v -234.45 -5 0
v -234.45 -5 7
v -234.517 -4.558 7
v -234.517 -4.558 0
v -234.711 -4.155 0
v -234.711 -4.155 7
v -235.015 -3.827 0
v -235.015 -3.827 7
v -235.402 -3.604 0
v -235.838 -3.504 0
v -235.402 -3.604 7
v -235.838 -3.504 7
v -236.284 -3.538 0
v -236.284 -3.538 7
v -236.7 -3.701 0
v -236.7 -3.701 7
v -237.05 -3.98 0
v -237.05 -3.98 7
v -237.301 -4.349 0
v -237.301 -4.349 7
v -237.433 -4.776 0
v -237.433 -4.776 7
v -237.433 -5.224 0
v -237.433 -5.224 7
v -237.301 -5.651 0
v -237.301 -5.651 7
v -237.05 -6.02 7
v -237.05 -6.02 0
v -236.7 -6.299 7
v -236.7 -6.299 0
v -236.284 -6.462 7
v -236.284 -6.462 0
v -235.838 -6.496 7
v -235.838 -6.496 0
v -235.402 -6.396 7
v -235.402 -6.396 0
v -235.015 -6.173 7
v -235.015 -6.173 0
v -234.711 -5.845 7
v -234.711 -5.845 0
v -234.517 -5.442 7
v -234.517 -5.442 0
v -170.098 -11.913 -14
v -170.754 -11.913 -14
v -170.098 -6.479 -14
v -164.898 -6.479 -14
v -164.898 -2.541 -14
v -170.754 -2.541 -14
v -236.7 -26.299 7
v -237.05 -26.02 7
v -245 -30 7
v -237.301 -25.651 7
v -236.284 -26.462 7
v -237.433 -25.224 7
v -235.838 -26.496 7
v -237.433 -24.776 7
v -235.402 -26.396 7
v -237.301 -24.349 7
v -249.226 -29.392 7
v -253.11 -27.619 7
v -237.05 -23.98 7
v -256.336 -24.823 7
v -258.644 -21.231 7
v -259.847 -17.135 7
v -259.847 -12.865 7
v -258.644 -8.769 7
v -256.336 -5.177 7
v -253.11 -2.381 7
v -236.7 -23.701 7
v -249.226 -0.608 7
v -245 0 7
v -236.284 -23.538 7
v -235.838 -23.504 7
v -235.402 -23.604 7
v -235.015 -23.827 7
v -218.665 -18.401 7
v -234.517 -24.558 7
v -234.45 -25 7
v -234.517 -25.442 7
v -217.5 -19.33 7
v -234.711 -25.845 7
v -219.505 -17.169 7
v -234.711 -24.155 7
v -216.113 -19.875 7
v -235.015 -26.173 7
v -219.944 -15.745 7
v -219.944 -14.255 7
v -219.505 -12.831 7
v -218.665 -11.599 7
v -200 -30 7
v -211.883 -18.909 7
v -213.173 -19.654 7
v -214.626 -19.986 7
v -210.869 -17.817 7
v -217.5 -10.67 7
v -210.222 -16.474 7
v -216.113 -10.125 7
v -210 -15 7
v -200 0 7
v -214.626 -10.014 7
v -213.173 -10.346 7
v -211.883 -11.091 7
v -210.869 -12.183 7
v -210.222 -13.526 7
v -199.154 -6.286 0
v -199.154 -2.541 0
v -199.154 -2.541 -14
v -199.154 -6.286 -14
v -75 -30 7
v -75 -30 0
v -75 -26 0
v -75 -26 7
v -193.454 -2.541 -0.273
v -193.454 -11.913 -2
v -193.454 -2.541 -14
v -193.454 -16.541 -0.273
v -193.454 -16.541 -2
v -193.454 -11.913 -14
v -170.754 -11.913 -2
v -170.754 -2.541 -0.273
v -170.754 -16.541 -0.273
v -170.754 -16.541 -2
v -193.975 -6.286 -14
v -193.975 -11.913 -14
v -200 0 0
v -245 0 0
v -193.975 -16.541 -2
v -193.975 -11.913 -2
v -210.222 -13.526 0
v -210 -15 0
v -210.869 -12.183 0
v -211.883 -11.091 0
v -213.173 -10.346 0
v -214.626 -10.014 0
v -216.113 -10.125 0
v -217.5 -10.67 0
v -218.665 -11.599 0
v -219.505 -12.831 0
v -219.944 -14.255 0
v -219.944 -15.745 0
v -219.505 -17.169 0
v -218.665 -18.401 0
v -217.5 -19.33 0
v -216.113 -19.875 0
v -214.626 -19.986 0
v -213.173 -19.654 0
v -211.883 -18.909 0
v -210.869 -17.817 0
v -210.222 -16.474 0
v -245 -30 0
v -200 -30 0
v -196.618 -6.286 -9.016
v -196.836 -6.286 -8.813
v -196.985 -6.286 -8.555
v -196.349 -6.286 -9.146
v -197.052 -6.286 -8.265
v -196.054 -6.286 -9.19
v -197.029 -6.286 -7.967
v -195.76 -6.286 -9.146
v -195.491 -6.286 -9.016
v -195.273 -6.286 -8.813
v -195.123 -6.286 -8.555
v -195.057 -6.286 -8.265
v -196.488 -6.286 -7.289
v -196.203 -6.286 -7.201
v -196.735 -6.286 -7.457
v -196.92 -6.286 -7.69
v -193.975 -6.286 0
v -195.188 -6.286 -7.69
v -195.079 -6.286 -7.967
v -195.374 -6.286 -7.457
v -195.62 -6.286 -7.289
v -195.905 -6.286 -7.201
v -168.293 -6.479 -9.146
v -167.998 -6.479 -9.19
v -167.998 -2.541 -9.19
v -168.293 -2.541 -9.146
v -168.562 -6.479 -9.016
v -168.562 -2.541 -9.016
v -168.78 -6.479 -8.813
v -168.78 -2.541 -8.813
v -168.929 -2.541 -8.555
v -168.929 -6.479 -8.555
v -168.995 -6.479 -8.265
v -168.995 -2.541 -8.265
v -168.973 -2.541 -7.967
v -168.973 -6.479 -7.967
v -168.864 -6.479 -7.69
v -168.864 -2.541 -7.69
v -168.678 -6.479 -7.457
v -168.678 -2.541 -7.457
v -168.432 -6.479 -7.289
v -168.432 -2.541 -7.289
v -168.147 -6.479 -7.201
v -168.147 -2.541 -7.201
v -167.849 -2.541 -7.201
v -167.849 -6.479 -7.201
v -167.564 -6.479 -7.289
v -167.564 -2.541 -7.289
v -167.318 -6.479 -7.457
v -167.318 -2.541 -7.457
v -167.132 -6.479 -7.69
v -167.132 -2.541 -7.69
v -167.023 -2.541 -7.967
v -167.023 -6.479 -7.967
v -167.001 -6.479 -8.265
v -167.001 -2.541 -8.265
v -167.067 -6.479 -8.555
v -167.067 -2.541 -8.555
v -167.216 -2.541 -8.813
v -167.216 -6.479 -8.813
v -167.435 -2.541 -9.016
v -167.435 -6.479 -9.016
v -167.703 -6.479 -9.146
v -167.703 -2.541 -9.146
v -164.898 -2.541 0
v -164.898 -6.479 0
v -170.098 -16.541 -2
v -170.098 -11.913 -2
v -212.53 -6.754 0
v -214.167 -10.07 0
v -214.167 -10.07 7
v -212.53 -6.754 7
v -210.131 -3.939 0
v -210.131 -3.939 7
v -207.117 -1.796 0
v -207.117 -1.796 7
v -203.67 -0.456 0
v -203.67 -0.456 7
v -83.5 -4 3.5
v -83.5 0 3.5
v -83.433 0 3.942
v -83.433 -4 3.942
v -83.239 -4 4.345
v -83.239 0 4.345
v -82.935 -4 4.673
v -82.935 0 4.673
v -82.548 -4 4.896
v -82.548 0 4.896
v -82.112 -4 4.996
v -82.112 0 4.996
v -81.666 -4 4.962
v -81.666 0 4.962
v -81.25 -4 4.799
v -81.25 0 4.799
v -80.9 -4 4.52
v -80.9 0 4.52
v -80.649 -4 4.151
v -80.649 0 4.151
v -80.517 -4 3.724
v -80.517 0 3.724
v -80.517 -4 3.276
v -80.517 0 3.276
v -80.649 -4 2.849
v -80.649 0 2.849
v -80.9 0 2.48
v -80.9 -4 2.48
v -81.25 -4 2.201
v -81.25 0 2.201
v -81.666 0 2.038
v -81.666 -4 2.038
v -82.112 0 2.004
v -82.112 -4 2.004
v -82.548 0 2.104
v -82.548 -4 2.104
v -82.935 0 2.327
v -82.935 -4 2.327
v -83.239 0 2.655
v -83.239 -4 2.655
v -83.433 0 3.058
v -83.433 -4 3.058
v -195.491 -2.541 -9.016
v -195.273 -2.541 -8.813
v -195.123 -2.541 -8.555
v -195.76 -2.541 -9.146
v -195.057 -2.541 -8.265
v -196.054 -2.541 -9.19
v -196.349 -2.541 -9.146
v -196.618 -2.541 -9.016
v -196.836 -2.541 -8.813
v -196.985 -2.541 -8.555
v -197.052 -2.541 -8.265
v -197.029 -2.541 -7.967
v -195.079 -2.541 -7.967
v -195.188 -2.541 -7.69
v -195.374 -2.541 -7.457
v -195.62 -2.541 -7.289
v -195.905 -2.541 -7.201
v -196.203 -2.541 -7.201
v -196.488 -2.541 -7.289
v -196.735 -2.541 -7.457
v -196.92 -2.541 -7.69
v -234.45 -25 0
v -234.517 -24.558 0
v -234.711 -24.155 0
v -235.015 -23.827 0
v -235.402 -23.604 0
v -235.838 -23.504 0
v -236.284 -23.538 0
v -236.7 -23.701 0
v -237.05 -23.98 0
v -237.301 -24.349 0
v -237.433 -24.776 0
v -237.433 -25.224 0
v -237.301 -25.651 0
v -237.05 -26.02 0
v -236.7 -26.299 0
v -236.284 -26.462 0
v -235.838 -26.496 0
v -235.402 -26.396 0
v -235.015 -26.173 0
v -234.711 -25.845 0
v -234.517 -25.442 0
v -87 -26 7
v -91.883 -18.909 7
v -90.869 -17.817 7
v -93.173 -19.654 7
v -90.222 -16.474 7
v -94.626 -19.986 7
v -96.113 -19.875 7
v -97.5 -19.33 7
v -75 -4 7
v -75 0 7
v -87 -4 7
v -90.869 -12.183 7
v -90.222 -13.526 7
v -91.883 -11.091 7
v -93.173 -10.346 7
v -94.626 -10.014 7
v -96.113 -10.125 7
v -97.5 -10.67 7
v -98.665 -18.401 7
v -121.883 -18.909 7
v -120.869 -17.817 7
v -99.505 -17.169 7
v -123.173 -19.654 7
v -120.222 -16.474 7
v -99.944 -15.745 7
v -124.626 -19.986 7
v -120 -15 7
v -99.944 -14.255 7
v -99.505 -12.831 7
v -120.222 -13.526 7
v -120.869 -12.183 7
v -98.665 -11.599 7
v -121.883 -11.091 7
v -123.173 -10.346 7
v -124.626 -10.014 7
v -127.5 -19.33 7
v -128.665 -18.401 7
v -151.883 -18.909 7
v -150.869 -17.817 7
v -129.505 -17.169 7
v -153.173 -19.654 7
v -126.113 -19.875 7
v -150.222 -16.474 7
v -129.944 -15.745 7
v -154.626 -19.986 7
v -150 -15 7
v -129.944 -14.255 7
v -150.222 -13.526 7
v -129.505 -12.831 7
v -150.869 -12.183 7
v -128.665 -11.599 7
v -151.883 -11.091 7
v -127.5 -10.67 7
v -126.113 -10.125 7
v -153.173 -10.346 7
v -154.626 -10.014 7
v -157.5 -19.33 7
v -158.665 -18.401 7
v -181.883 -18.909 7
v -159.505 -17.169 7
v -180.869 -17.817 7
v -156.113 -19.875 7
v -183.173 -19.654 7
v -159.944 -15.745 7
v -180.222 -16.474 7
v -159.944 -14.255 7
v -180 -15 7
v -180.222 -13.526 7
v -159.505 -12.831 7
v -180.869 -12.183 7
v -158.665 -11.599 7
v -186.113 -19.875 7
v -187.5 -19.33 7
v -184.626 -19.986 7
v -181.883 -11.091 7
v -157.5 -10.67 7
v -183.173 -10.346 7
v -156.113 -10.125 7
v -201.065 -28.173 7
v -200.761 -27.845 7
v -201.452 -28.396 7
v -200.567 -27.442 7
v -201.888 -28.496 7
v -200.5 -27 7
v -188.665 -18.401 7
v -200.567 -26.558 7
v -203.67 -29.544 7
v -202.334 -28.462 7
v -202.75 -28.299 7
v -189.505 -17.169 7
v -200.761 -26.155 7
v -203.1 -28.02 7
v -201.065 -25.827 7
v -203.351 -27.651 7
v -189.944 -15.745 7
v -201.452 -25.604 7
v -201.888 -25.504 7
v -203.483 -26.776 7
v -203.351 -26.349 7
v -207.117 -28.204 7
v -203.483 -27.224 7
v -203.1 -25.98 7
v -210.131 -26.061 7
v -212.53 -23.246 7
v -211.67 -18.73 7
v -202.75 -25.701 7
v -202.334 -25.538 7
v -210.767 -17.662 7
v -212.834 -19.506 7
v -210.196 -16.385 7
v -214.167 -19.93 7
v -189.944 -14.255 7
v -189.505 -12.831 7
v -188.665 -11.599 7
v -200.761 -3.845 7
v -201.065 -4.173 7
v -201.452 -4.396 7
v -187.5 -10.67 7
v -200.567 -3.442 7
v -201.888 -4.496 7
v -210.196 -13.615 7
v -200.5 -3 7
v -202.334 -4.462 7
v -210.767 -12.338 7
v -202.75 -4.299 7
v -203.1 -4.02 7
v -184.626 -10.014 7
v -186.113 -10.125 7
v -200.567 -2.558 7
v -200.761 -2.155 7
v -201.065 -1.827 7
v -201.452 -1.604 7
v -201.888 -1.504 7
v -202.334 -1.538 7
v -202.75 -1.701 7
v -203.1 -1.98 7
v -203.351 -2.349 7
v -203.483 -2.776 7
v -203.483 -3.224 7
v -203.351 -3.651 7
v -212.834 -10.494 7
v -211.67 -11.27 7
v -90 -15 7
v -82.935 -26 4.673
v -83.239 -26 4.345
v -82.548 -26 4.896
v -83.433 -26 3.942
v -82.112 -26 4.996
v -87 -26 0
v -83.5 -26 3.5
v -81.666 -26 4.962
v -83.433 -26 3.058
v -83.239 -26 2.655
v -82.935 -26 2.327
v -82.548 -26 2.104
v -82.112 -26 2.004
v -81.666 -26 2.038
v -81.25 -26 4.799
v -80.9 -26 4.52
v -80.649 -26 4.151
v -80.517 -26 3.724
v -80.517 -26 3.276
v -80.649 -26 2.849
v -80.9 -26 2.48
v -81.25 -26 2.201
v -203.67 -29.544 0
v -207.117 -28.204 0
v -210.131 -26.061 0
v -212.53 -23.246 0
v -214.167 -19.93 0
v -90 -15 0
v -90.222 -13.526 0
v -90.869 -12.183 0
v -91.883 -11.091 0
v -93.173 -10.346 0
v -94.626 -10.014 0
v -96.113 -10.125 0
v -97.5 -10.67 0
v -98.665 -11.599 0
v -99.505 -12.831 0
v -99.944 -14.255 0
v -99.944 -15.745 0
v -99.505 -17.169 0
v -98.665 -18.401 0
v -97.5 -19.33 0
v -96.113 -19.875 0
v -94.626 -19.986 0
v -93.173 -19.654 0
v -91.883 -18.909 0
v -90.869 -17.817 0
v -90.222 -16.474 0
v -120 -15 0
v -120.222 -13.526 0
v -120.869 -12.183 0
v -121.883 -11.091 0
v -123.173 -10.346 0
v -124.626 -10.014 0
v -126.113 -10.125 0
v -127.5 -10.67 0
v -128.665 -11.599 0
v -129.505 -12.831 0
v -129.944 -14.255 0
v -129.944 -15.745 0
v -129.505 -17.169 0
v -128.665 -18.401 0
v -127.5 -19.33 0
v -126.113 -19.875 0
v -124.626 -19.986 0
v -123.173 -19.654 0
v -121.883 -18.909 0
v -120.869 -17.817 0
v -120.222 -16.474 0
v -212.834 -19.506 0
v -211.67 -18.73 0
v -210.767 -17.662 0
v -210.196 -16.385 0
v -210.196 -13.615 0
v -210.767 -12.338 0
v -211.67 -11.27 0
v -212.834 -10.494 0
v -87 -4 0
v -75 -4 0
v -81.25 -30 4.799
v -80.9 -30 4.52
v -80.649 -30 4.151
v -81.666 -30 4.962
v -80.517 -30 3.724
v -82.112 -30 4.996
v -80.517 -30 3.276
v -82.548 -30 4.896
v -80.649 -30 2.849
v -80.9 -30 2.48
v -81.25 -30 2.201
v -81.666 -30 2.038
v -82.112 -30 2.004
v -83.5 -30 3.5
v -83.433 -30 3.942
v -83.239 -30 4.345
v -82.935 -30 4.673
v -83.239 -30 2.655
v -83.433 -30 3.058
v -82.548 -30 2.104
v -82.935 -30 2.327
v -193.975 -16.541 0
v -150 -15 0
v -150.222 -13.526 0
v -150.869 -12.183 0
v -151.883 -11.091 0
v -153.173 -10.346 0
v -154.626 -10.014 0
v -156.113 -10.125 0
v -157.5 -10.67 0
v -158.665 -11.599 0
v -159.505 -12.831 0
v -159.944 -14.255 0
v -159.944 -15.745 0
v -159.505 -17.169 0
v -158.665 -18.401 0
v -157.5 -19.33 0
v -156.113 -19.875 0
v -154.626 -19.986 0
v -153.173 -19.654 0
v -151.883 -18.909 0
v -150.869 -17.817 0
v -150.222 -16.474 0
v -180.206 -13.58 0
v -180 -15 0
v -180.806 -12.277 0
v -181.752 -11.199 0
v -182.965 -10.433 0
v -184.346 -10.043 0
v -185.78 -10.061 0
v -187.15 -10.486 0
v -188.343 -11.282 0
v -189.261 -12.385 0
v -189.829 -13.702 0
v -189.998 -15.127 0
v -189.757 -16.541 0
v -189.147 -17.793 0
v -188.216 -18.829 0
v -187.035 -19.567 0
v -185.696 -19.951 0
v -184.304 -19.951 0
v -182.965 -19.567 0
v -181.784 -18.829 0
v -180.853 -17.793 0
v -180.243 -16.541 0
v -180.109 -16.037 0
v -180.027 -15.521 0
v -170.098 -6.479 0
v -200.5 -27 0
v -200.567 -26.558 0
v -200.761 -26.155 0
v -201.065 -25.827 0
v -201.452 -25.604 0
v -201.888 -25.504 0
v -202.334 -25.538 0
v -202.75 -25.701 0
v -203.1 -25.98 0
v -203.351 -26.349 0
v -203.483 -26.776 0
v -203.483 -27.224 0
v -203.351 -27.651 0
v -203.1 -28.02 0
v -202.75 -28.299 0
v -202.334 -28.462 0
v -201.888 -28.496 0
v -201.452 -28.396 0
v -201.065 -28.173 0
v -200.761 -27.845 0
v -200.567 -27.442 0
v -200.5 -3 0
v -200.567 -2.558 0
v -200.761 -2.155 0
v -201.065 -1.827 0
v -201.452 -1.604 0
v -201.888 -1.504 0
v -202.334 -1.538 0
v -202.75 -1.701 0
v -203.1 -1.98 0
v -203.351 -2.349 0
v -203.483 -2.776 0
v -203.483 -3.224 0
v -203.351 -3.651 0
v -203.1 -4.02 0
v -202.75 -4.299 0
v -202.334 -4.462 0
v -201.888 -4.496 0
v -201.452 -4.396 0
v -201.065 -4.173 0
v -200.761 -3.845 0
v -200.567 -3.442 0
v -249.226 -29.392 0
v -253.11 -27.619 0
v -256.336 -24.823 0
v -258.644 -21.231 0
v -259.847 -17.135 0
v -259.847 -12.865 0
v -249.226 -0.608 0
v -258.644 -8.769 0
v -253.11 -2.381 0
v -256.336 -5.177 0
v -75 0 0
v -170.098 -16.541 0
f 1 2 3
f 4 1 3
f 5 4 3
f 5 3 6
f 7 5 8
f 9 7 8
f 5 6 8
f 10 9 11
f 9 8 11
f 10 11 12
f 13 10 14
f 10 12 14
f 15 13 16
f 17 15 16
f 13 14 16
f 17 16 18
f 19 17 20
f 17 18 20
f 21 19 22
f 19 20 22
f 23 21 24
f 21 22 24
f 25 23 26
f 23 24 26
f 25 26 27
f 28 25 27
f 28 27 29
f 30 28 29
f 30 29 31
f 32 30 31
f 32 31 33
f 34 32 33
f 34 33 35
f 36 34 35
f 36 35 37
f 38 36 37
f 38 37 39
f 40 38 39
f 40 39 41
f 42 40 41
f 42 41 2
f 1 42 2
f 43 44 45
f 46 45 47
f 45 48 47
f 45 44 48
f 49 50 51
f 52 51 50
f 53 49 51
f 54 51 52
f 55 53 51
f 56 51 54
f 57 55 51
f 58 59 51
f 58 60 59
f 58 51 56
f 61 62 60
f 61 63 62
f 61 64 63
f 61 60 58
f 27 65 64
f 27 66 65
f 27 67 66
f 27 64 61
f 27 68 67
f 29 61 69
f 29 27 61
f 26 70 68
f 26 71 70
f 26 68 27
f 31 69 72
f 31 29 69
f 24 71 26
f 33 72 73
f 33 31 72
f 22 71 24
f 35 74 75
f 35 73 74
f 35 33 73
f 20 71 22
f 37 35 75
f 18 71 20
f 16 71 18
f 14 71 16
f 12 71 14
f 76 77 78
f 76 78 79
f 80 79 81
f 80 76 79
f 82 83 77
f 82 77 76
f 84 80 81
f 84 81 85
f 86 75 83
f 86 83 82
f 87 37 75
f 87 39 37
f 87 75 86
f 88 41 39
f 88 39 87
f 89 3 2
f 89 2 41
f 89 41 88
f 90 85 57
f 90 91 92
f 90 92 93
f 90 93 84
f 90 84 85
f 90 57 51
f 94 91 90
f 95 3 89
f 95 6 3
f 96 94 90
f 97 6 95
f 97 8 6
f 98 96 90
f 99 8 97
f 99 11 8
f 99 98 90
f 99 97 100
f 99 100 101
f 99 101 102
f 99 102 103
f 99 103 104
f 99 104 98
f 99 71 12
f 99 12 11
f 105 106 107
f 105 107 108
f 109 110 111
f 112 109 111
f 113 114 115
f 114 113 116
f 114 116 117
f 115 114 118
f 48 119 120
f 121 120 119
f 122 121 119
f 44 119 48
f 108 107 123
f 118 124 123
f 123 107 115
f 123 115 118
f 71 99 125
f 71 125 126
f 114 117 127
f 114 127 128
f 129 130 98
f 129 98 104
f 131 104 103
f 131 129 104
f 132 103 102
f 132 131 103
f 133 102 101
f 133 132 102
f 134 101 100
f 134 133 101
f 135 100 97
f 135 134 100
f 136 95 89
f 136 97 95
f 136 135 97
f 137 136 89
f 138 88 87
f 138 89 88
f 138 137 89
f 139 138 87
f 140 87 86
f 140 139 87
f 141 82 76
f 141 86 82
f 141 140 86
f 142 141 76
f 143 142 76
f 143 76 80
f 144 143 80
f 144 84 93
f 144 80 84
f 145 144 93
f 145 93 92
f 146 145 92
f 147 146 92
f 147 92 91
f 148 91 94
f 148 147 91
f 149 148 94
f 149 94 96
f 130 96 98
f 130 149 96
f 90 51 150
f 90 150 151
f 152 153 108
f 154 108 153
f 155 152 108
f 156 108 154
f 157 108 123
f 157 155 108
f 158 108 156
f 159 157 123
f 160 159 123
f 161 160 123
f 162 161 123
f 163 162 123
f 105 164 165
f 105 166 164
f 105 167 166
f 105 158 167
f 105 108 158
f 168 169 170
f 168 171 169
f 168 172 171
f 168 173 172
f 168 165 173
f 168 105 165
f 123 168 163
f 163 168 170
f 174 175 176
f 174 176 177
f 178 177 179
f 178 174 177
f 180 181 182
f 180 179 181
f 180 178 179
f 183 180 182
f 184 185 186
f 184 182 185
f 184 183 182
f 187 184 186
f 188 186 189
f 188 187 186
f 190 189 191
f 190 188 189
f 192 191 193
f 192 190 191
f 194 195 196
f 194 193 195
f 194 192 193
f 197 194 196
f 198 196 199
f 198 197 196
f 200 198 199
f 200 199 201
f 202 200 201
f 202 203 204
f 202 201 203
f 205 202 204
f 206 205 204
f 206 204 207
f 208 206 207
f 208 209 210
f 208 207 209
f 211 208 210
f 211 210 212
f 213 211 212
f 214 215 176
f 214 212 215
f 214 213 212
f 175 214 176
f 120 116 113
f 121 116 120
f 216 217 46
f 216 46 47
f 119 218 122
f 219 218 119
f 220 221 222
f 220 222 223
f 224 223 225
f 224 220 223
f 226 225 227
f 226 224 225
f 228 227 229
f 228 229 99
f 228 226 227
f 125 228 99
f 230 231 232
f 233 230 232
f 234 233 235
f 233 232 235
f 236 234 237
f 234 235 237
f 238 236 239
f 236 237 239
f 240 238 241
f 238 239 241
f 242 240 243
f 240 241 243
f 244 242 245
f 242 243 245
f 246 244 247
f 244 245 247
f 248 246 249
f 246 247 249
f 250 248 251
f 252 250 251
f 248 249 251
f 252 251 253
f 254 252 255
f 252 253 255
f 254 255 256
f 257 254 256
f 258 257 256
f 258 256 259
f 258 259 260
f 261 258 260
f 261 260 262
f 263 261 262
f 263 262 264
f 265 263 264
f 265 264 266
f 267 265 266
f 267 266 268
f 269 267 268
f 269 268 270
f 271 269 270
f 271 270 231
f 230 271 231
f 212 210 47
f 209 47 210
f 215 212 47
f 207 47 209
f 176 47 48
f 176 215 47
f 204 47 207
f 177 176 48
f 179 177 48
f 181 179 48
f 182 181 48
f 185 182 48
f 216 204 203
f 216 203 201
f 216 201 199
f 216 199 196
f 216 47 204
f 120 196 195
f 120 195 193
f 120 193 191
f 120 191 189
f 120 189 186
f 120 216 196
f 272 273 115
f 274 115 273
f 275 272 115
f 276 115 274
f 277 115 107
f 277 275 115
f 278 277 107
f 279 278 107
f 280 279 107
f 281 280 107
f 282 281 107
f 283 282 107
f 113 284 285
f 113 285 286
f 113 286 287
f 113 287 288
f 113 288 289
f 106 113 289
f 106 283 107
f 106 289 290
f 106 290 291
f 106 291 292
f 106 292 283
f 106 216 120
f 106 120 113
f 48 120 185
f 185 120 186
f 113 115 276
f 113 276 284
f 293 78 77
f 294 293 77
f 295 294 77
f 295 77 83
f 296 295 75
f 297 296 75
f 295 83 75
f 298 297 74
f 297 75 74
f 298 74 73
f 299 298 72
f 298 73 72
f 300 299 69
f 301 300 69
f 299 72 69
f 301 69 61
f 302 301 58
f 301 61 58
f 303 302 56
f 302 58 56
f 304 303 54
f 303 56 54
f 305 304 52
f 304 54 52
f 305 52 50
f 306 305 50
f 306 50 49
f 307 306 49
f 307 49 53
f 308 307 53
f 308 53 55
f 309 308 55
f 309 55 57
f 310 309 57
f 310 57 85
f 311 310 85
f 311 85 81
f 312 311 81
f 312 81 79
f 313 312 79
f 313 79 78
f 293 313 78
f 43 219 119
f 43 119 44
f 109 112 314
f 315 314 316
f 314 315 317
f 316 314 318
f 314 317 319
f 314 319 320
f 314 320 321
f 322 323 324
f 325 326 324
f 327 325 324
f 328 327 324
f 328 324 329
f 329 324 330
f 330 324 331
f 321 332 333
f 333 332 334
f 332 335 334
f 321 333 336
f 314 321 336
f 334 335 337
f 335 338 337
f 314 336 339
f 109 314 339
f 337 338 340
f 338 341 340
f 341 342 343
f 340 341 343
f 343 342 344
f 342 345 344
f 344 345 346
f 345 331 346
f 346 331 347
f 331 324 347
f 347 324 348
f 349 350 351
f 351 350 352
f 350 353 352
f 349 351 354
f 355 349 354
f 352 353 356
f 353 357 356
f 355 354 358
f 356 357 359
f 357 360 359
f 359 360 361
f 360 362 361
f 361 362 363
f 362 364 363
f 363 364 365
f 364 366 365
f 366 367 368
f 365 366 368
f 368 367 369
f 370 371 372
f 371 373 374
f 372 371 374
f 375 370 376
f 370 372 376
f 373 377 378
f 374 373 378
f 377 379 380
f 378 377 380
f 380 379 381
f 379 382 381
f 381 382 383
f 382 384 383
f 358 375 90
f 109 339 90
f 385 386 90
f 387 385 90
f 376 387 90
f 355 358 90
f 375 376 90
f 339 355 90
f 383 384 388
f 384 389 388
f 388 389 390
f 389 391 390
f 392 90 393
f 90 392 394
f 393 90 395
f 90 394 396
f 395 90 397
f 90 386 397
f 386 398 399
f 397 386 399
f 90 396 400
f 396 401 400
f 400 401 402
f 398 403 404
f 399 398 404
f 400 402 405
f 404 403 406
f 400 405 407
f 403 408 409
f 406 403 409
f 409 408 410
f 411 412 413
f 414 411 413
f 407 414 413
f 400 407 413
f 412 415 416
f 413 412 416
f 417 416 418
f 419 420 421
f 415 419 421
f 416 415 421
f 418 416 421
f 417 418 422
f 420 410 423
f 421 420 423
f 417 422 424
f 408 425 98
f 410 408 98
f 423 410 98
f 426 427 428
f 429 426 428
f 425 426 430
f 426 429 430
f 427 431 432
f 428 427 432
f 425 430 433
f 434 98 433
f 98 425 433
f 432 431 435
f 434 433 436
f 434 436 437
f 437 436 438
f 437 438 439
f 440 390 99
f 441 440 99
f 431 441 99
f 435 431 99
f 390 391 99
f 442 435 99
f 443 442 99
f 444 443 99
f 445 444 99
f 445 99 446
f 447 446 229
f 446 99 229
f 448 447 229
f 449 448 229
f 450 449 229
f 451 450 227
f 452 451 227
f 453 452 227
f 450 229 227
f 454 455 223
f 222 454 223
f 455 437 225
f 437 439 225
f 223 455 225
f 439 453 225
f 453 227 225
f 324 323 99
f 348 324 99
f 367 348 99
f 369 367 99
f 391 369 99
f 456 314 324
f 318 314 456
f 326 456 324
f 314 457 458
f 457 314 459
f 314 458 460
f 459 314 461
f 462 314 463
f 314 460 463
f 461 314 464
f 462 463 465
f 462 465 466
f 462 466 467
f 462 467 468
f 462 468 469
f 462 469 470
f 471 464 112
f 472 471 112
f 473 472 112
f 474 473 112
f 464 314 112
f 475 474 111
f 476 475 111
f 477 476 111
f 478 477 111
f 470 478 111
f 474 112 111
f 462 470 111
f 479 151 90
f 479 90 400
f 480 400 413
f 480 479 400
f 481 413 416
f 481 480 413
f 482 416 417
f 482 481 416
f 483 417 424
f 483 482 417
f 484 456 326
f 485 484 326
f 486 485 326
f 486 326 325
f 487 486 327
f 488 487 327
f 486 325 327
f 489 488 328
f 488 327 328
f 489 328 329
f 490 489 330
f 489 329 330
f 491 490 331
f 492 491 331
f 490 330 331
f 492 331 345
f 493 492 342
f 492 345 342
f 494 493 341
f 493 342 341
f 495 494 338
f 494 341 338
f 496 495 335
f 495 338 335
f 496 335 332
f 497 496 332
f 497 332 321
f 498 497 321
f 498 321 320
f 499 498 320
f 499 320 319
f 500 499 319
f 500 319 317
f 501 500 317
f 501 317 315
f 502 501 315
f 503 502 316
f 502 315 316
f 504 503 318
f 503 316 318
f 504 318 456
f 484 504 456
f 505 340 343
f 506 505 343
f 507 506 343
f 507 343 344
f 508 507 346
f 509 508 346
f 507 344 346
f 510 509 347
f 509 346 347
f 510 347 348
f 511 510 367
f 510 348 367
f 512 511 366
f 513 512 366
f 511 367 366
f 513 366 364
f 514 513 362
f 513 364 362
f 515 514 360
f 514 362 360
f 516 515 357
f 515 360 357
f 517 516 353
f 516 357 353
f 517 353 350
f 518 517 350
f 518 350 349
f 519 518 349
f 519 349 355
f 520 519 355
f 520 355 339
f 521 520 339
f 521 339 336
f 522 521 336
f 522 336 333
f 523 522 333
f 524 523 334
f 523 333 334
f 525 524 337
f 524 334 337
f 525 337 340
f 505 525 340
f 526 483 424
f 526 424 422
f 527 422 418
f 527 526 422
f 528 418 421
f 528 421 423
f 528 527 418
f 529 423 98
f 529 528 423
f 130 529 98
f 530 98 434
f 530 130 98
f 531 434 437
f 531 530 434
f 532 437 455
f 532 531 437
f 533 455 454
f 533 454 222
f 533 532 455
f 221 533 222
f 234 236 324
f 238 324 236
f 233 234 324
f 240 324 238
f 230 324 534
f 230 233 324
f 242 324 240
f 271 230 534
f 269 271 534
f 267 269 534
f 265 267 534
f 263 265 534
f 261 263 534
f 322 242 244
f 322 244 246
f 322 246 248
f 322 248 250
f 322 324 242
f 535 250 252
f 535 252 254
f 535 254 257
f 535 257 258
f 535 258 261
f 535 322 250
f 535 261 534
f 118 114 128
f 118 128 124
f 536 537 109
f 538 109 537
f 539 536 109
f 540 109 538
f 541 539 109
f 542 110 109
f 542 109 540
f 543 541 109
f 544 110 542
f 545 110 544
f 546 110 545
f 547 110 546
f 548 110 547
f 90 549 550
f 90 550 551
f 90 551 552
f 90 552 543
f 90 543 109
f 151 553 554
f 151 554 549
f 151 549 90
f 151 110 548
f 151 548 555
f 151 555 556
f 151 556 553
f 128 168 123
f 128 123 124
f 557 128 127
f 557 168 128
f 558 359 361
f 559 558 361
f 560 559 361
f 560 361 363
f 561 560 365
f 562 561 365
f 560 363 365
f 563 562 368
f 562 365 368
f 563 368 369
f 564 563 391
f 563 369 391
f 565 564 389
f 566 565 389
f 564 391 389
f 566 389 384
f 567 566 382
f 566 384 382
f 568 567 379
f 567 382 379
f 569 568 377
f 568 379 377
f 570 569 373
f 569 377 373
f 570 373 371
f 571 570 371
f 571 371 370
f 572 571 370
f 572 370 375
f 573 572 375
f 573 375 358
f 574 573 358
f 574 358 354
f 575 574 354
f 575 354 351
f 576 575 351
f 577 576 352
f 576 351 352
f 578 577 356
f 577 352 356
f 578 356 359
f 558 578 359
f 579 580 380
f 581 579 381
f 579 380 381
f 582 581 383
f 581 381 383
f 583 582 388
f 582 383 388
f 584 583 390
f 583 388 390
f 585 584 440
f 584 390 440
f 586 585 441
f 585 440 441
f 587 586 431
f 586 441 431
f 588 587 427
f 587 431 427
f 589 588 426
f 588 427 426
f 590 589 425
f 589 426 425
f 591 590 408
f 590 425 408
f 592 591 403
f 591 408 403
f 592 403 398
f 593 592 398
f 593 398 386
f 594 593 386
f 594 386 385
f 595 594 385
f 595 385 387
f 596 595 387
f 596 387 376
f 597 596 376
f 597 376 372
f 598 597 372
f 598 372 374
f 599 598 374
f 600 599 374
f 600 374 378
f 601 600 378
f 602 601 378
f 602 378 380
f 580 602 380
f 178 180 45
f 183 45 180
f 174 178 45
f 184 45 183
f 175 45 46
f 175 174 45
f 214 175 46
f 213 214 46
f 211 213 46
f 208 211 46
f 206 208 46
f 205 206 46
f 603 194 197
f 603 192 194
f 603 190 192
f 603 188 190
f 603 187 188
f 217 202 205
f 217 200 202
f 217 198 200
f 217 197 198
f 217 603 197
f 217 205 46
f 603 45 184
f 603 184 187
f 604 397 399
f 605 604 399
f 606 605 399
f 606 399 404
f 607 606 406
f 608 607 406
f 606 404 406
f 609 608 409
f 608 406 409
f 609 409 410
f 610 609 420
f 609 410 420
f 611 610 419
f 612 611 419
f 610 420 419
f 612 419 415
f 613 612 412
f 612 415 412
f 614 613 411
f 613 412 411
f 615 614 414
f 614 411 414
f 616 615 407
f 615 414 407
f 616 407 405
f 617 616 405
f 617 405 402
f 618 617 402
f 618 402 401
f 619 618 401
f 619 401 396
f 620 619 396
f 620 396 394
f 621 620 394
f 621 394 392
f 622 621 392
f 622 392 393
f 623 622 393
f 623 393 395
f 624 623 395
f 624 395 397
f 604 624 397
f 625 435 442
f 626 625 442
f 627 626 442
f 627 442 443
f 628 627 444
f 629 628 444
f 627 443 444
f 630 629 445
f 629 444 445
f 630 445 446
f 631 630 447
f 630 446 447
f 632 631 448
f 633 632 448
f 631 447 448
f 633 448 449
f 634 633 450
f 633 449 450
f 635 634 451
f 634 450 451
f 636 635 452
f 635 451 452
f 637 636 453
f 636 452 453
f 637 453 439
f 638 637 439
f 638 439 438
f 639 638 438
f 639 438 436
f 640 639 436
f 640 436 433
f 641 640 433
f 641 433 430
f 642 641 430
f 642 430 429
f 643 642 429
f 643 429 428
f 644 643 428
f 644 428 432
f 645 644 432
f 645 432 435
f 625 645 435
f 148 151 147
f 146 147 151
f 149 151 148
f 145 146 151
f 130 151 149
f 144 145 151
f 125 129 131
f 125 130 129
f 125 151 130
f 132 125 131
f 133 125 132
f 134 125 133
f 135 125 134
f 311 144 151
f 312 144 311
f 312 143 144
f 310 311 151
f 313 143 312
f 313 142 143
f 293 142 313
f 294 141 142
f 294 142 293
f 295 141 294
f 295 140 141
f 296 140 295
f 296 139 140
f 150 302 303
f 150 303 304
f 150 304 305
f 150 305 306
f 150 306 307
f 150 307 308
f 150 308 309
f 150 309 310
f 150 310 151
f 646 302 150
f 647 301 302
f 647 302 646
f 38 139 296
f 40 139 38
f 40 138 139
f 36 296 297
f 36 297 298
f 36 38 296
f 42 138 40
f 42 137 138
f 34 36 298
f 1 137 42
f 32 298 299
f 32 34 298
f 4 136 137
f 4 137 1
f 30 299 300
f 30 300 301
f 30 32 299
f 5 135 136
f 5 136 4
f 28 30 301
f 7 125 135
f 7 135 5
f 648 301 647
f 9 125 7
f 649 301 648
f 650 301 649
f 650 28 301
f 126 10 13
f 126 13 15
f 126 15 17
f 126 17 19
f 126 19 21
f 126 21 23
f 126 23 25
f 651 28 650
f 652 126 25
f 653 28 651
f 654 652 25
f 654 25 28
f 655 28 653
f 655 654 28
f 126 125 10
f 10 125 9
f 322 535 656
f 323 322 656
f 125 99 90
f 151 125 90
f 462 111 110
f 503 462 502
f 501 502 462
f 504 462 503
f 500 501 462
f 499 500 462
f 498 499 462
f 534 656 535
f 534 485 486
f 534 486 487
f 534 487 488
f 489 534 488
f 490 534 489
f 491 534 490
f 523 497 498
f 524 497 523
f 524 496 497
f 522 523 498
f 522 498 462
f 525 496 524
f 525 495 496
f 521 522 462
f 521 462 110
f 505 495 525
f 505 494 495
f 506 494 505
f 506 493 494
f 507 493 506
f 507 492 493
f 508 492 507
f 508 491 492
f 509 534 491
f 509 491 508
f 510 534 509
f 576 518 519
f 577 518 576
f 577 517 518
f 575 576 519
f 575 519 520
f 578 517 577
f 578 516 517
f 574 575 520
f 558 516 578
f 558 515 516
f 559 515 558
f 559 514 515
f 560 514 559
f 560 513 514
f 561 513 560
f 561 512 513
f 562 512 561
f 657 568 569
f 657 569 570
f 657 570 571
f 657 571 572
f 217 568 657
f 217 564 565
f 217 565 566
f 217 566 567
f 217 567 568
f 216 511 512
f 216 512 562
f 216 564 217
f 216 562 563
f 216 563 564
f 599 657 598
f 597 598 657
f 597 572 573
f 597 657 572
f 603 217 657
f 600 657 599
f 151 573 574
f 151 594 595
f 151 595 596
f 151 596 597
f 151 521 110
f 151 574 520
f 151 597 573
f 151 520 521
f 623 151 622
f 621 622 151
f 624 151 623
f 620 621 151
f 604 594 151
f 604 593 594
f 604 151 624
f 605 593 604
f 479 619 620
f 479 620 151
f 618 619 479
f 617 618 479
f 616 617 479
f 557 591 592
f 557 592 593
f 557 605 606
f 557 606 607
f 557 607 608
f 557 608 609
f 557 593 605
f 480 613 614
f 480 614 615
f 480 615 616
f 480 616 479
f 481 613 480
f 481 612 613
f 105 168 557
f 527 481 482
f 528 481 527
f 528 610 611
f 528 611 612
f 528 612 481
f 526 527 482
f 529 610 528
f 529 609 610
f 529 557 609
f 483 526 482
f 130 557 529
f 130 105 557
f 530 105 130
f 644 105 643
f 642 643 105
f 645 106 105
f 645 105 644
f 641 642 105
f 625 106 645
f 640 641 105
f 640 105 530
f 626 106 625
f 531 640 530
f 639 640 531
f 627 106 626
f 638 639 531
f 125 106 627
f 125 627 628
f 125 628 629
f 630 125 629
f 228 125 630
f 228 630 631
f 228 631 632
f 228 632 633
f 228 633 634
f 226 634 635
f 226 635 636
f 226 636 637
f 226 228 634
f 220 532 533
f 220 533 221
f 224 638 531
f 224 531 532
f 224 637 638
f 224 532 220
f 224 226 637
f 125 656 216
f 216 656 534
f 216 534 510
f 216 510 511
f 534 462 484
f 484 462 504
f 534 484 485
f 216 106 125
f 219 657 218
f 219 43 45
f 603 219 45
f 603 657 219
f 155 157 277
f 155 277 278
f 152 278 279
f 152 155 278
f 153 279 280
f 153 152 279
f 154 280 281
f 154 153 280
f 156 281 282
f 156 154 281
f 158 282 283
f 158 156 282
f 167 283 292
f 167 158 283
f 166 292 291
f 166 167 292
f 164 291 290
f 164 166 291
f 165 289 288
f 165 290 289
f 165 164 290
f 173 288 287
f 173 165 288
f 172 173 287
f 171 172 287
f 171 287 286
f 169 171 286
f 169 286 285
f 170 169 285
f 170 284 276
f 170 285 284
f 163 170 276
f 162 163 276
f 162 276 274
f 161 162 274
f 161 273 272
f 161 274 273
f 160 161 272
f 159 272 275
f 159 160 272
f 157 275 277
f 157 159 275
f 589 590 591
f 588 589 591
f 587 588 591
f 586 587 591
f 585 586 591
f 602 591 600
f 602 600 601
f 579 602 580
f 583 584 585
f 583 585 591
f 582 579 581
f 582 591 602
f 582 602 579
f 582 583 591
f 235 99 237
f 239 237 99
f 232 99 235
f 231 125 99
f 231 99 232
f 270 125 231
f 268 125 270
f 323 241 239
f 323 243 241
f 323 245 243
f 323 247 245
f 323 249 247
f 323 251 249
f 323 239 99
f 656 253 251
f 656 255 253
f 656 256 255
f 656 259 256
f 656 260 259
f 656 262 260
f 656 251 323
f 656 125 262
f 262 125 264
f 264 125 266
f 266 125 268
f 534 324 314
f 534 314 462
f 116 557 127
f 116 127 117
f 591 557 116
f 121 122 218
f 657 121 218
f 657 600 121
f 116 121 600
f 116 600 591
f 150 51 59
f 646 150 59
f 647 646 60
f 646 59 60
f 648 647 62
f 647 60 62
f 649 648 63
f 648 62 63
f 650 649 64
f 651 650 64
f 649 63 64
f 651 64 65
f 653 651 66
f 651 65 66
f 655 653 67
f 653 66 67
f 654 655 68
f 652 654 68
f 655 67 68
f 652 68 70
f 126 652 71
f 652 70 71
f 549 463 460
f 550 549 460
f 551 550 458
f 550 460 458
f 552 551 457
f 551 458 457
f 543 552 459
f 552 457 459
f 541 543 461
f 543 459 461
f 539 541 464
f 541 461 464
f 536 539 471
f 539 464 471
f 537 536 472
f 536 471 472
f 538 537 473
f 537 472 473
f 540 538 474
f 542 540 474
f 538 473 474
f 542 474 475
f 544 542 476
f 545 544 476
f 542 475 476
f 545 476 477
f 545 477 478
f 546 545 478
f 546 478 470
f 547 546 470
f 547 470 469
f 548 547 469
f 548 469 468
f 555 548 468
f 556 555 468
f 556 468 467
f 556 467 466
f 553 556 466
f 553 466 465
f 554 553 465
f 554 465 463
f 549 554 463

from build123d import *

# Parameters (mm, degrees)
BOSS_EXTRUDE1_DEPTH             = 7
SKETCH2_R                       = 5
CUT_EXTRUDE1_DEPTH              = 7
LPATTERN1_COUNT                 = 7
LPATTERN1_PITCH                 = 30
SKETCH6_R                       = 5
CUT_EXTRUDE2_DEPTH              = 10
BOSS_EXTRUDE2_DEPTH             = 21
CUT_EXTRUDE3_DEPTH              = 21
CUT_EXTRUDE4_REACH              = 220.014
SKETCH9_R                       = 1.5
CUT_EXTRUDE5_REACH              = 220.771
SKETCH10_W                      = 5.271518542
SKETCH10_H                      = 23.219312301
BOSS_EXTRUDE3_DEPTH             = 14
CUT_EXTRUDE6_DEPTH              = 1
CUT_EXTRUDE6_DEPTH_BACK         = 22
SKETCH12_W                      = 22.7
SKETCH12_H                      = 12.3
SKETCH12_H_2                    = 14.702182947
CUT_EXTRUDE7_DEPTH              = 7
CUT_EXTRUDE7_DEPTH_BACK         = 7
SKETCH13_R                      = 1
CUT_EXTRUDE8_REACH              = 184.393
SKETCH14_W                      = 12
SKETCH14_H                      = 12
CUT_EXTRUDE10_REACH             = 220.014
SKETCH16_W                      = 140
SKETCH16_H                      = 71.757581457
CUT_EXTRUDE10_DIRECTION_2_DEPTH = 24
SKETCH17_W                      = 7
SKETCH17_H                      = 22
CUT_EXTRUDE11_DEPTH             = 12
SKETCH18_R                      = 1.5
CUT_EXTRUDE12_DEPTH             = 218.533905403
SKETCH19_R                      = 1.5
CUT_EXTRUDE13_DEPTH             = 219.096309001
SKETCH20_R                      = 1.5
BOSS_EXTRUDE4_DEPTH             = 7
SKETCH21_R                      = 1.5
CUT_EXTRUDE14_DEPTH             = 10
CUT_EXTRUDE15_DEPTH             = 263.566182133
CUT_EXTRUDE15_DEPTH_BACK        = 263.566182133
SKETCH22_R                      = 5


with BuildPart() as part:
    # Sketch1 → Boss-Extrude1 (new body)
    with BuildSketch(Plane.XY):
        with BuildLine():
            Line((-200, 0), (50, 0))
            ThreePointArc((50, 0), (65, -15), (50, -30))
            Line((50, -30), (-200, -30))
            ThreePointArc((-200, -30), (-215, -15), (-200, 0))
        make_face()
    extrude(amount=BOSS_EXTRUDE1_DEPTH)

    # Sketch2 → Cut-Extrude1 (cut)
    with BuildSketch(Plane.XY.offset(7)):
        with Locations((-185, -15)):
            Circle(SKETCH2_R)
    cut_extrude1 = extrude(amount=-CUT_EXTRUDE1_DEPTH, mode=Mode.SUBTRACT)

    # LPattern1: Cut-Extrude1 ×7
    with Locations(*[(i * LPATTERN1_PITCH, 0, 0) for i in range(1, LPATTERN1_COUNT)]):
        add(cut_extrude1, mode=Mode.SUBTRACT)

    # Sketch6 → Cut-Extrude2 (cut)
    with BuildSketch(Plane(origin=(0, 0, 0), x_dir=(-1, 0, 0), z_dir=(0, 0, -1))):
        with Locations((-50, -15)):
            Circle(SKETCH6_R)
    extrude(amount=-CUT_EXTRUDE2_DEPTH, mode=Mode.SUBTRACT)

    # Sketch7 → Boss-Extrude2 (add)
    with BuildSketch(Plane(origin=(0, 0, 0), x_dir=(0, 0, -1), z_dir=(1, 0, 0))):
        with BuildLine():
            Line((20.124409349, -8.046570755), (20.124409349, -21.391782887))
            ThreePointArc((20.124409349, -21.391782887), (10.062204675, -26.149434806), (0, -21.391782887))
            Line((0, -21.391782887), (0, -8.046570755))
            ThreePointArc((0, -8.046570755), (10.062204675, -2.930122505), (20.124409349, -8.046570755))
        make_face()
    extrude(amount=BOSS_EXTRUDE2_DEPTH)

    # Sketch8 → Cut-Extrude3 (cut)
    with BuildSketch(Plane(origin=(21, 0, 0), x_dir=(0, 0, -1), z_dir=(1, 0, 0))):
        with BuildLine():
            Line((0.343653188, -8.603738845), (0.343653188, -21.003738845))
            Line((0.343653188, -21.003738845), (3.251608919, -23.33010343))
            Line((3.251608919, -23.33010343), (6.11482687, -24.672236845))
            Line((6.11482687, -24.672236845), (10.141227113, -25.388041332))
            Line((10.141227113, -25.388041332), (14.122889575, -24.672236845))
            Line((14.122889575, -24.672236845), (17.165058648, -23.33010343))
            Line((17.165058648, -23.33010343), (19.670374355, -20.953281344))
            Line((19.670374355, -20.953281344), (19.670374355, -8.553281344))
            ThreePointArc((19.670374355, -8.553281344), (9.994377841, -3.738573545), (0.343653188, -8.603738845))
        make_face()
    extrude(amount=-CUT_EXTRUDE3_DEPTH, mode=Mode.SUBTRACT)

    # Sketch9 → Cut-Extrude4 (cut, up to next)
    with BuildSketch(Plane(origin=(0, 0, 0), x_dir=(-1, 0, 0), z_dir=(0, 0, -1)), mode=Mode.PRIVATE) as cut_extrude4_sk1:
        with Locations((-29.5, -6.25)):
            Circle(SKETCH9_R)
    cut_extrude4_tool1 = extrude(cut_extrude4_sk1.sketch, amount=-CUT_EXTRUDE4_REACH, mode=Mode.PRIVATE) & part.part
    # Sketch9 → Cut-Extrude4 (cut, up to next)
    with BuildSketch(Plane(origin=(0, 0, 0), x_dir=(-1, 0, 0), z_dir=(0, 0, -1)), mode=Mode.PRIVATE) as cut_extrude4_sk2:
        with Locations((-29.5, -23.75)):
            Circle(SKETCH9_R)
    cut_extrude4_tool2 = extrude(cut_extrude4_sk2.sketch, amount=-CUT_EXTRUDE4_REACH, mode=Mode.PRIVATE) & part.part
    add(cut_extrude4_tool1.solids().sort_by_distance((29.5, -6.25, 0))[0], mode=Mode.SUBTRACT)
    add(cut_extrude4_tool2.solids().sort_by_distance((29.5, -23.75, 0))[0], mode=Mode.SUBTRACT)

    # Cut-Extrude5: up to this face of the body (flat: up to its plane)
    cut_extrude5_end = Plane(part.part.faces().sort_by_distance((-78.33059512, -15.01080435, 0))[0])
    # Sketch10 → Cut-Extrude5 (cut, up to the picked face)
    with BuildSketch(Plane(origin=(0, 0, -20.124409349), x_dir=(-1, 0, 0), z_dir=(0, 0, -1)), mode=Mode.PRIVATE) as cut_extrude5_sk1:
        with Locations((-2.635759271, -14.539778656)):
            Rectangle(SKETCH10_W, SKETCH10_H)
    cut_extrude5_tool1 = split(extrude(cut_extrude5_sk1.sketch, amount=-CUT_EXTRUDE5_REACH, mode=Mode.PRIVATE), bisect_by=cut_extrude5_end, keep=Keep.BOTH, mode=Mode.PRIVATE)
    add(cut_extrude5_tool1.solids().sort_by(Axis((2.635759, -14.539779, -20.124409), (0, 0, 1)))[0], mode=Mode.SUBTRACT)

    # Sketch11 → Boss-Extrude3 (add)
    with BuildSketch(Plane(origin=(0, 0, 0), x_dir=(-1, 0, 0), z_dir=(0, 0, -1))):
        Polygon((60.097644306, -6.420008597), (60.097644306, -23.913431972), (36.21993437, -23.913431972), (36.21993437, -6.613282571), (31.020509523, -6.613282571), (31.020509523, -2.674883318), (65.276628567, -2.674883318), (65.276628567, -6.420008597), align=None)
        Polygon((193.975354243, -6.285954501), (193.975354243, -16.540829221), (170.097644306, -16.540829221), (170.097644306, -6.479228475), (164.898219459, -6.479228475), (164.898219459, -2.540829221), (199.154338504, -2.540829221), (199.154338504, -6.285954501), align=None)
    extrude(amount=BOSS_EXTRUDE3_DEPTH)

    # Sketch12 → Cut-Extrude6 (cut, two sides: drawn at the far end of the back side and taken through both)
    with BuildSketch(Plane(origin=(0, -2.674883318, 0), x_dir=(1, 0, 0), z_dir=(0, 1, 0)).offset(-CUT_EXTRUDE6_DEPTH_BACK)):
        with Locations((-48.226628567, 6.703751831)):
            Rectangle(SKETCH12_W, SKETCH12_H)
        with Locations((-182.104338504, 7.624156034)):
            Rectangle(SKETCH12_W, SKETCH12_H_2)
    extrude(amount=CUT_EXTRUDE6_DEPTH + CUT_EXTRUDE6_DEPTH_BACK, mode=Mode.SUBTRACT)

    # Sketch13 → Cut-Extrude7 (cut, two sides: drawn at the far end of the back side and taken through both)
    with BuildSketch(Plane(origin=(0, -2.674883318, 0), x_dir=(1, 0, 0), z_dir=(0, 1, 0)).offset(-CUT_EXTRUDE7_DEPTH_BACK)):
        with Locations(Location((-167.998219459, 8.19, 0), (0, 0, 90))):
            Circle(SKETCH13_R)
        with Locations(Location((-196.054338504, 8.19, 0), (0, 0, 90))):
            Circle(SKETCH13_R)
        with Locations(Location((-62.176628567, 8.19, 0), (0, 0, 90))):
            Circle(SKETCH13_R)
        with Locations(Location((-34.120509523, 8.19, 0), (0, 0, 90))):
            Circle(SKETCH13_R)
    extrude(amount=CUT_EXTRUDE7_DEPTH + CUT_EXTRUDE7_DEPTH_BACK, mode=Mode.SUBTRACT)

    # Cut-Extrude8: up to this face of the body (flat: up to its plane)
    cut_extrude8_end = Plane(part.part.faces().sort_by_distance((-193.975354243, -11.413391861, -7))[0])
    # Sketch14 → Cut-Extrude8 (cut, up to the picked face)
    with BuildSketch(Plane(origin=(-36.21993437, 0, 0), x_dir=(0, 0, -1), z_dir=(1, 0, 0)), mode=Mode.PRIVATE) as cut_extrude8_sk1:
        with Locations((8, -17.913431972)):
            Rectangle(SKETCH14_W, SKETCH14_H)
    cut_extrude8_tool1 = split(extrude(cut_extrude8_sk1.sketch, amount=-CUT_EXTRUDE8_REACH, mode=Mode.PRIVATE), bisect_by=cut_extrude8_end, keep=Keep.BOTH, mode=Mode.PRIVATE)
    add(cut_extrude8_tool1.solids().sort_by(Axis((-36.219934, -17.913432, -8), (-1, 0, 0)))[0], mode=Mode.SUBTRACT)

    # Sketch16 → Cut-Extrude10 (cut, up to next)
    with BuildSketch(Plane(origin=(0, 0, 0), x_dir=(-1, 0, 0), z_dir=(0, 0, -1)), mode=Mode.PRIVATE) as cut_extrude10_sk1:
        with Locations((5, -12.999910307)):
            Rectangle(SKETCH16_W, SKETCH16_H)
    cut_extrude10_tool1 = extrude(cut_extrude10_sk1.sketch, amount=-CUT_EXTRUDE10_REACH, mode=Mode.PRIVATE) & part.part
    add(cut_extrude10_tool1.solids().sort_by_distance((-5, -12.99991, 0))[0], mode=Mode.SUBTRACT)

    # Sketch16 → Cut-Extrude10 direction 2 (cut)
    with BuildSketch(Plane(origin=(0, 0, 0), x_dir=(-1, 0, 0), z_dir=(0, 0, -1))):
        with Locations((5, -12.999910307)):
            Rectangle(SKETCH16_W, SKETCH16_H)
    extrude(amount=CUT_EXTRUDE10_DIRECTION_2_DEPTH, mode=Mode.SUBTRACT)

    # Sketch17 → Cut-Extrude11 (cut)
    with BuildSketch(Plane(origin=(-75, 0, 0), x_dir=(0, 0, -1), z_dir=(1, 0, 0))):
        with Locations((-3.5, -15)):
            Rectangle(SKETCH17_W, SKETCH17_H)
    extrude(amount=-CUT_EXTRUDE11_DEPTH, mode=Mode.SUBTRACT)

    # Sketch18 → Cut-Extrude12 (cut, through all)
    with BuildSketch(Plane(origin=(0, 0, 0), x_dir=(1, 0, 0), z_dir=(0, 1, 0))):
        with Locations(Location((-82, -3.5, 0), (0, 0, 180))):
            Circle(SKETCH18_R)
    extrude(amount=-CUT_EXTRUDE12_DEPTH, mode=Mode.SUBTRACT)

    # Sketch19 → Cut-Extrude13 (cut, through all)
    with BuildSketch(Plane.XY.offset(7)):
        with Locations((-202, -3)):
            Circle(SKETCH19_R)
        with Locations((-202, -27)):
            Circle(SKETCH19_R)
    extrude(amount=-CUT_EXTRUDE13_DEPTH, mode=Mode.SUBTRACT)


with BuildPart() as body_2:
    # Sketch20 → Boss-Extrude4 (new body)
    # profile 1 of 5: a face of its own
    with BuildSketch(Plane.XY.offset(7)):
        with BuildLine():
            Line((-200, 0), (-245, 0))
            Line((-245, 0), (-245, -30))
            Line((-245, -30), (-200, -30))
            ThreePointArc((-200, -30), (-215, -15), (-200, 0))
        make_face()
    # profile 2 of 5: a face of its own
    with BuildSketch(Plane.XY.offset(7)):
        with BuildLine():
            Line((-245, 0), (-245, -30))
            ThreePointArc((-245, -30), (-260, -15), (-245, 0))
        make_face()
    # profile 3 of 5: a face of its own
    with BuildSketch(Plane.XY.offset(7)):
        with BuildLine():
            Line((-200, 0), (-200, -30))
            ThreePointArc((-200, -30), (-215, -15), (-200, 0))
        make_face()
        with Locations((-202, -27)):
            Circle(SKETCH20_R, mode=Mode.SUBTRACT)
        with Locations((-202, -3)):
            Circle(SKETCH20_R, mode=Mode.SUBTRACT)
    # profile 4 of 5: a face of its own
    with BuildSketch(Plane.XY.offset(7)):
        with Locations((-202, -27)):
            Circle(SKETCH20_R)
    # profile 5 of 5: a face of its own
    with BuildSketch(Plane.XY.offset(7)):
        with Locations((-202, -3)):
            Circle(SKETCH20_R)
    extrude(amount=-BOSS_EXTRUDE4_DEPTH)

    # Sketch21 → Cut-Extrude14 (cut)
    with BuildSketch(Plane.XY.offset(7)):
        with Locations((-235.95, -25)):
            Circle(SKETCH21_R)
        with Locations((-235.95, -5)):
            Circle(SKETCH21_R)
    extrude(amount=-CUT_EXTRUDE14_DEPTH, mode=Mode.SUBTRACT)


with BuildPart() as cut_extrude15_tool:
    # Sketch22 → Cut-Extrude15 (new, two sides: drawn at the far end of the back side and taken through both)
    with BuildSketch(Plane.XY.offset(7).offset(-CUT_EXTRUDE15_DEPTH_BACK)):
        with Locations((-215, -15)):
            Circle(SKETCH22_R)
    extrude(amount=CUT_EXTRUDE15_DEPTH + CUT_EXTRUDE15_DEPTH_BACK)


with BuildPart() as part_1:
    add(part.part)

    # Cut-Extrude15: cut by cut_extrude15_tool
    add(cut_extrude15_tool.part, mode=Mode.SUBTRACT)


with BuildPart() as body_2_1:
    add(body_2.part)

    # Cut-Extrude15: cut by cut_extrude15_tool
    add(cut_extrude15_tool.part, mode=Mode.SUBTRACT)


solid = Compound([part_1.part, body_2_1.part])
